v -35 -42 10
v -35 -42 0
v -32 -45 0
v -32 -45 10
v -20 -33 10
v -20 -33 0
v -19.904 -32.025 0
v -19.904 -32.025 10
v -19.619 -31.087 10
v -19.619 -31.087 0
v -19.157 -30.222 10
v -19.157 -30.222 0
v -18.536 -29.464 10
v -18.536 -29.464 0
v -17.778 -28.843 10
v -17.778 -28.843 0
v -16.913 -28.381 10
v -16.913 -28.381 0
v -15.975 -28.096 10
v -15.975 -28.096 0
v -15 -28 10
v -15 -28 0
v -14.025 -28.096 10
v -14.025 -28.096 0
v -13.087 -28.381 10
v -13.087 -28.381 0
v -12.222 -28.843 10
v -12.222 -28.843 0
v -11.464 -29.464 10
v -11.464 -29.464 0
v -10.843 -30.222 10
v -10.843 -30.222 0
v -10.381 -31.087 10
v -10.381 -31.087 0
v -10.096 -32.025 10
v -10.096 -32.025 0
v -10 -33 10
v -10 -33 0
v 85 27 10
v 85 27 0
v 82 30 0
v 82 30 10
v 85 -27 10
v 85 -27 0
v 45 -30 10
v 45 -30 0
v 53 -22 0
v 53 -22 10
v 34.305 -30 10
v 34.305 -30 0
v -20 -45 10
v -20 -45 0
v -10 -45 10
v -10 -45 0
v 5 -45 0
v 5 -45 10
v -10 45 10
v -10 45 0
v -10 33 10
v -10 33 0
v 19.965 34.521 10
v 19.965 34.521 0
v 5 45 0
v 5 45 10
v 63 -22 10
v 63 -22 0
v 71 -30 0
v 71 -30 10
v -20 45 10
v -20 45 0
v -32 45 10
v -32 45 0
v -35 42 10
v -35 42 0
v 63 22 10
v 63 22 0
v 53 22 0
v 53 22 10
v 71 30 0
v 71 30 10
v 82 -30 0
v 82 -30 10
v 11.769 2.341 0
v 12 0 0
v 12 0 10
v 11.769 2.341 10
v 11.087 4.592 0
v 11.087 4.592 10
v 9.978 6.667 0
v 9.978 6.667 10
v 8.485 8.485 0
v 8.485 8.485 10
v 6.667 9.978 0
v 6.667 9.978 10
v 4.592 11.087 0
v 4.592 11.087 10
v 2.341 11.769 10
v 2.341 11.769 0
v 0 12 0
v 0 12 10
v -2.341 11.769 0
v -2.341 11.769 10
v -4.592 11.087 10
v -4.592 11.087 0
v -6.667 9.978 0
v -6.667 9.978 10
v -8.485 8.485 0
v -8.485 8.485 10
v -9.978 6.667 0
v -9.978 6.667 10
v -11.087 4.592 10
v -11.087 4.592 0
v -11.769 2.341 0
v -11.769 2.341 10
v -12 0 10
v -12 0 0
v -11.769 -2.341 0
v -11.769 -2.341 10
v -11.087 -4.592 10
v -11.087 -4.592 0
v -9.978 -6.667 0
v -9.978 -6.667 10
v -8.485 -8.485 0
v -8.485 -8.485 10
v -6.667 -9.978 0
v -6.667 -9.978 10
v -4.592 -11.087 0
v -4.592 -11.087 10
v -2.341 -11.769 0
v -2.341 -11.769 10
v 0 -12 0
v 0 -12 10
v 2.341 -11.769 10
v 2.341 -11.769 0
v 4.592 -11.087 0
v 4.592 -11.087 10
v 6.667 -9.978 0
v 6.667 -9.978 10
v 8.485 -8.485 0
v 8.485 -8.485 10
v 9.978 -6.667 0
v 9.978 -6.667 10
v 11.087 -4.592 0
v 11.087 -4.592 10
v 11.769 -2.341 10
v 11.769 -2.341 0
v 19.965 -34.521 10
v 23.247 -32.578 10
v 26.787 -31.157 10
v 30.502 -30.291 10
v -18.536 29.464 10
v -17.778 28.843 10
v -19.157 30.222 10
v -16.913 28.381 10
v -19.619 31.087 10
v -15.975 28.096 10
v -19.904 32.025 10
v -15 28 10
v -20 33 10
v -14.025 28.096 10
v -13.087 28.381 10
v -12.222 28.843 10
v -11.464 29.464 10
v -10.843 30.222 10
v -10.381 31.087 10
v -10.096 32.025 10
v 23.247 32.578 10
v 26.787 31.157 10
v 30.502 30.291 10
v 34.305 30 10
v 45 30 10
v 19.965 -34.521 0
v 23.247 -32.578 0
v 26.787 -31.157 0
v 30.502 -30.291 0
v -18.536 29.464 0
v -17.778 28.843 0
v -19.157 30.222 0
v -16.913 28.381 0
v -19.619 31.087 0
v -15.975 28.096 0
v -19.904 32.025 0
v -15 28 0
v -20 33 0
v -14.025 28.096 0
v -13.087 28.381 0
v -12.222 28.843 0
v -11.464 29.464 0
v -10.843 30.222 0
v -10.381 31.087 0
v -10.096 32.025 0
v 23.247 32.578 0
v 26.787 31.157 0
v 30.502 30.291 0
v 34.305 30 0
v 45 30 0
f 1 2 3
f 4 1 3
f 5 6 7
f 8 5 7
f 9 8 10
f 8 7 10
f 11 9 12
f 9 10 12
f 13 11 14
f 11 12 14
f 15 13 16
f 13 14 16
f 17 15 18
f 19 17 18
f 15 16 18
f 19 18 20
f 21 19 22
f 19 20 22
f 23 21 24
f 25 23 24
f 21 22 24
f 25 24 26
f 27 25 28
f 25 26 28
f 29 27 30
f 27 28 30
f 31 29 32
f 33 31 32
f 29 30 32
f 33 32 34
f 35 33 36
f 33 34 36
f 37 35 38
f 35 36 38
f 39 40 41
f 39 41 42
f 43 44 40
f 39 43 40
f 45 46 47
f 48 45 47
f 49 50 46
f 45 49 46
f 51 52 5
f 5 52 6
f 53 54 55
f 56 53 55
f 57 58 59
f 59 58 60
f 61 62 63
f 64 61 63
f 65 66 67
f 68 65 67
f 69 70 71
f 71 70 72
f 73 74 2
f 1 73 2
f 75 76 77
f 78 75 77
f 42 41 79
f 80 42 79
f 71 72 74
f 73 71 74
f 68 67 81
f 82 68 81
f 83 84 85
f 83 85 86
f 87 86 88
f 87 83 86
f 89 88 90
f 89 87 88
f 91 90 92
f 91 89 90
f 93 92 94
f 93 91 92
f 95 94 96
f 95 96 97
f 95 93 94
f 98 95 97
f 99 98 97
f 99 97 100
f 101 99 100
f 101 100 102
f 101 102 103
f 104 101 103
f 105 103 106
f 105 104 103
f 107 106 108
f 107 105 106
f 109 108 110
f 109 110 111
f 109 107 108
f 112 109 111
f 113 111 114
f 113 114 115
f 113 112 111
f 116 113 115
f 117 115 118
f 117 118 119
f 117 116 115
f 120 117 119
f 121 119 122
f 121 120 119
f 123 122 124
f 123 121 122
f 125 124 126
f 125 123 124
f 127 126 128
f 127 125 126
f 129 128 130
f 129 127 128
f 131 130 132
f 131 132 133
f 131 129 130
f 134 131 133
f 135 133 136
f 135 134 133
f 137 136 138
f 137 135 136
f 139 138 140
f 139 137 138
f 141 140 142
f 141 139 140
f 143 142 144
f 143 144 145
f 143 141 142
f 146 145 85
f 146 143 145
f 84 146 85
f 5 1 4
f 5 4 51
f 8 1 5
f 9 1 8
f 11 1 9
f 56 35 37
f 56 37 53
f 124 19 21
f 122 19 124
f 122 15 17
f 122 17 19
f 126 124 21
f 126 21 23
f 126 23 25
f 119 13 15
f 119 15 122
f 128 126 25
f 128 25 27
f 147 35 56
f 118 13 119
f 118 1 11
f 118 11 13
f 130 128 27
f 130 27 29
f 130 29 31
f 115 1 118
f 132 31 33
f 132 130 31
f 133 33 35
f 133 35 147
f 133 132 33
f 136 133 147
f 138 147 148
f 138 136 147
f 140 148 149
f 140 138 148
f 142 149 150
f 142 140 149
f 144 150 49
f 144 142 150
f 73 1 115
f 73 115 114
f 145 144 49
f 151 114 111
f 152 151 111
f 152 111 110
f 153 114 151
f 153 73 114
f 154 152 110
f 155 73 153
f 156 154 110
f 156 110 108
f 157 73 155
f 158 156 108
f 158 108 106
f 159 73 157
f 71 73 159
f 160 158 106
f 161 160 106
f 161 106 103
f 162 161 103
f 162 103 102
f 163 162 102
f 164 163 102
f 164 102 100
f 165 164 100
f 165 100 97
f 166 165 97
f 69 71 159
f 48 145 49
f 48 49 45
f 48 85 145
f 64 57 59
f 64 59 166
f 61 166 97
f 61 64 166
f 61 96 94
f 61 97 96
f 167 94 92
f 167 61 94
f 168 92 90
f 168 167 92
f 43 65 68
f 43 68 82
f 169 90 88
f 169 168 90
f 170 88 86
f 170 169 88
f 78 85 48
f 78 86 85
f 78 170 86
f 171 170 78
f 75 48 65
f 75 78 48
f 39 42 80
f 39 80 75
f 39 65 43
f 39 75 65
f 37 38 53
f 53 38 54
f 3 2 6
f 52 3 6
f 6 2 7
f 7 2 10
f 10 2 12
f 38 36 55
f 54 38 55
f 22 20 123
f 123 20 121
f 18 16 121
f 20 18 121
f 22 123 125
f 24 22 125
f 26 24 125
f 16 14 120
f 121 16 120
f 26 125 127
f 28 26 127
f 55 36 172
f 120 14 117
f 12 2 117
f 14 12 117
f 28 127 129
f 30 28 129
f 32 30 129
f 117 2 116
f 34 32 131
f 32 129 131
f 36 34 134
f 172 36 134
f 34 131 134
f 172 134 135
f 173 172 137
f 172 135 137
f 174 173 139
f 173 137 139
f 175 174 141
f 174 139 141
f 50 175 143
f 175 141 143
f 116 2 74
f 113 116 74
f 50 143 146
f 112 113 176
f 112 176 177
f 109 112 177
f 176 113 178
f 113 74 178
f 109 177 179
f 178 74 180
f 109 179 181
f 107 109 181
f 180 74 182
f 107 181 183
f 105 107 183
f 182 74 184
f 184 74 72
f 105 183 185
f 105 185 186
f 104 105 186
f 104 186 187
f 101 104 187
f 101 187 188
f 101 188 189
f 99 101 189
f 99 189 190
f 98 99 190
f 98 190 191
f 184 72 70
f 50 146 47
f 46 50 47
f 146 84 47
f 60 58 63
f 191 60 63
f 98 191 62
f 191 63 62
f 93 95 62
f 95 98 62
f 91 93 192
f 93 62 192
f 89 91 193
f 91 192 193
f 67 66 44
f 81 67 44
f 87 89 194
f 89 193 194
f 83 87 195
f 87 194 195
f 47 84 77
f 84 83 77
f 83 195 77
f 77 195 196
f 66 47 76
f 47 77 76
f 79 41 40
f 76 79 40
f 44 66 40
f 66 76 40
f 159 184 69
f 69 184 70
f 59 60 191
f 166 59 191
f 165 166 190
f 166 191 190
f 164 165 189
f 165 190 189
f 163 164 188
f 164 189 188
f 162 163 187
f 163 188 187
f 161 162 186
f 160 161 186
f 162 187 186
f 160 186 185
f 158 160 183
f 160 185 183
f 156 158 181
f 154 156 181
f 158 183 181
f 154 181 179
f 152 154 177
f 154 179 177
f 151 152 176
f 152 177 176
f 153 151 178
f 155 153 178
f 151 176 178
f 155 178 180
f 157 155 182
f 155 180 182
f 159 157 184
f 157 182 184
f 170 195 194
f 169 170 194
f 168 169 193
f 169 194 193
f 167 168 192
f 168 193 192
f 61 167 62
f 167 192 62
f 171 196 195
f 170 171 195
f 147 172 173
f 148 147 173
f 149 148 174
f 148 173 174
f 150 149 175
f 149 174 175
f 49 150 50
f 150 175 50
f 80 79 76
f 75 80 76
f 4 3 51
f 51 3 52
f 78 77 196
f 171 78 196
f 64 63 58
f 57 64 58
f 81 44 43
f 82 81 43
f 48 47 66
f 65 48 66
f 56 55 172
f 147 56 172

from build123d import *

# Parameters (mm, degrees)
SKETCH1_R           = 12
BOSS_EXTRUDE1_DEPTH = 10
CHAMFER1_SIZE       = 3


with BuildPart() as part:
    # Sketch1 → Boss-Extrude1 (new body)
    with BuildSketch(Plane.XY):
        with BuildLine():
            Line((-35, 42), (-35, -42))
            Line((-35, -42), (-32, -45))
            Line((-32, -45), (-20, -45))
            Line((-20, -45), (-20, -33))
            ThreePointArc((-20, -33), (-15, -28), (-10, -33))
            Line((-10, -33), (-10, -45))
            Line((-10, -45), (5, -45))
            Line((5, -45), (19.965278914, -34.521198893))
            ThreePointArc((19.965278914, -34.521198893), (26.787044835, -31.157076231), (34.304689823, -30))
            Line((34.304689823, -30), (45, -30))
            Line((45, -30), (53, -22))
            Line((53, -22), (63, -22))
            Line((63, -22), (71, -30))
            Line((71, -30), (85, -30))
            Line((85, -30), (85, 30))
            Line((85, 30), (71, 30))
            Line((71, 30), (63, 22))
            Line((63, 22), (53, 22))
            Line((53, 22), (45, 30))
            Line((45, 30), (34.304689823, 30))
            ThreePointArc((34.304689823, 30), (26.787044835, 31.157076231), (19.965278914, 34.521198893))
            Line((19.965278914, 34.521198893), (5, 45))
            Line((5, 45), (-10, 45))
            Line((-10, 45), (-10, 33))
            ThreePointArc((-10, 33), (-15, 28), (-20, 33))
            Line((-20, 33), (-20, 45))
            Line((-20, 45), (-32, 45))
            Line((-32, 45), (-35, 42))
        make_face()
        Circle(SKETCH1_R, mode=Mode.SUBTRACT)
    extrude(amount=BOSS_EXTRUDE1_DEPTH)

    # Chamfer1
    chamfer1_edges = [part.edges().sort_by_distance(p)[0] for p in [
        (85, 30, 5),
        (85, -30, 5),
    ]]
    chamfer(chamfer1_edges, length=CHAMFER1_SIZE)


solid = part.part
